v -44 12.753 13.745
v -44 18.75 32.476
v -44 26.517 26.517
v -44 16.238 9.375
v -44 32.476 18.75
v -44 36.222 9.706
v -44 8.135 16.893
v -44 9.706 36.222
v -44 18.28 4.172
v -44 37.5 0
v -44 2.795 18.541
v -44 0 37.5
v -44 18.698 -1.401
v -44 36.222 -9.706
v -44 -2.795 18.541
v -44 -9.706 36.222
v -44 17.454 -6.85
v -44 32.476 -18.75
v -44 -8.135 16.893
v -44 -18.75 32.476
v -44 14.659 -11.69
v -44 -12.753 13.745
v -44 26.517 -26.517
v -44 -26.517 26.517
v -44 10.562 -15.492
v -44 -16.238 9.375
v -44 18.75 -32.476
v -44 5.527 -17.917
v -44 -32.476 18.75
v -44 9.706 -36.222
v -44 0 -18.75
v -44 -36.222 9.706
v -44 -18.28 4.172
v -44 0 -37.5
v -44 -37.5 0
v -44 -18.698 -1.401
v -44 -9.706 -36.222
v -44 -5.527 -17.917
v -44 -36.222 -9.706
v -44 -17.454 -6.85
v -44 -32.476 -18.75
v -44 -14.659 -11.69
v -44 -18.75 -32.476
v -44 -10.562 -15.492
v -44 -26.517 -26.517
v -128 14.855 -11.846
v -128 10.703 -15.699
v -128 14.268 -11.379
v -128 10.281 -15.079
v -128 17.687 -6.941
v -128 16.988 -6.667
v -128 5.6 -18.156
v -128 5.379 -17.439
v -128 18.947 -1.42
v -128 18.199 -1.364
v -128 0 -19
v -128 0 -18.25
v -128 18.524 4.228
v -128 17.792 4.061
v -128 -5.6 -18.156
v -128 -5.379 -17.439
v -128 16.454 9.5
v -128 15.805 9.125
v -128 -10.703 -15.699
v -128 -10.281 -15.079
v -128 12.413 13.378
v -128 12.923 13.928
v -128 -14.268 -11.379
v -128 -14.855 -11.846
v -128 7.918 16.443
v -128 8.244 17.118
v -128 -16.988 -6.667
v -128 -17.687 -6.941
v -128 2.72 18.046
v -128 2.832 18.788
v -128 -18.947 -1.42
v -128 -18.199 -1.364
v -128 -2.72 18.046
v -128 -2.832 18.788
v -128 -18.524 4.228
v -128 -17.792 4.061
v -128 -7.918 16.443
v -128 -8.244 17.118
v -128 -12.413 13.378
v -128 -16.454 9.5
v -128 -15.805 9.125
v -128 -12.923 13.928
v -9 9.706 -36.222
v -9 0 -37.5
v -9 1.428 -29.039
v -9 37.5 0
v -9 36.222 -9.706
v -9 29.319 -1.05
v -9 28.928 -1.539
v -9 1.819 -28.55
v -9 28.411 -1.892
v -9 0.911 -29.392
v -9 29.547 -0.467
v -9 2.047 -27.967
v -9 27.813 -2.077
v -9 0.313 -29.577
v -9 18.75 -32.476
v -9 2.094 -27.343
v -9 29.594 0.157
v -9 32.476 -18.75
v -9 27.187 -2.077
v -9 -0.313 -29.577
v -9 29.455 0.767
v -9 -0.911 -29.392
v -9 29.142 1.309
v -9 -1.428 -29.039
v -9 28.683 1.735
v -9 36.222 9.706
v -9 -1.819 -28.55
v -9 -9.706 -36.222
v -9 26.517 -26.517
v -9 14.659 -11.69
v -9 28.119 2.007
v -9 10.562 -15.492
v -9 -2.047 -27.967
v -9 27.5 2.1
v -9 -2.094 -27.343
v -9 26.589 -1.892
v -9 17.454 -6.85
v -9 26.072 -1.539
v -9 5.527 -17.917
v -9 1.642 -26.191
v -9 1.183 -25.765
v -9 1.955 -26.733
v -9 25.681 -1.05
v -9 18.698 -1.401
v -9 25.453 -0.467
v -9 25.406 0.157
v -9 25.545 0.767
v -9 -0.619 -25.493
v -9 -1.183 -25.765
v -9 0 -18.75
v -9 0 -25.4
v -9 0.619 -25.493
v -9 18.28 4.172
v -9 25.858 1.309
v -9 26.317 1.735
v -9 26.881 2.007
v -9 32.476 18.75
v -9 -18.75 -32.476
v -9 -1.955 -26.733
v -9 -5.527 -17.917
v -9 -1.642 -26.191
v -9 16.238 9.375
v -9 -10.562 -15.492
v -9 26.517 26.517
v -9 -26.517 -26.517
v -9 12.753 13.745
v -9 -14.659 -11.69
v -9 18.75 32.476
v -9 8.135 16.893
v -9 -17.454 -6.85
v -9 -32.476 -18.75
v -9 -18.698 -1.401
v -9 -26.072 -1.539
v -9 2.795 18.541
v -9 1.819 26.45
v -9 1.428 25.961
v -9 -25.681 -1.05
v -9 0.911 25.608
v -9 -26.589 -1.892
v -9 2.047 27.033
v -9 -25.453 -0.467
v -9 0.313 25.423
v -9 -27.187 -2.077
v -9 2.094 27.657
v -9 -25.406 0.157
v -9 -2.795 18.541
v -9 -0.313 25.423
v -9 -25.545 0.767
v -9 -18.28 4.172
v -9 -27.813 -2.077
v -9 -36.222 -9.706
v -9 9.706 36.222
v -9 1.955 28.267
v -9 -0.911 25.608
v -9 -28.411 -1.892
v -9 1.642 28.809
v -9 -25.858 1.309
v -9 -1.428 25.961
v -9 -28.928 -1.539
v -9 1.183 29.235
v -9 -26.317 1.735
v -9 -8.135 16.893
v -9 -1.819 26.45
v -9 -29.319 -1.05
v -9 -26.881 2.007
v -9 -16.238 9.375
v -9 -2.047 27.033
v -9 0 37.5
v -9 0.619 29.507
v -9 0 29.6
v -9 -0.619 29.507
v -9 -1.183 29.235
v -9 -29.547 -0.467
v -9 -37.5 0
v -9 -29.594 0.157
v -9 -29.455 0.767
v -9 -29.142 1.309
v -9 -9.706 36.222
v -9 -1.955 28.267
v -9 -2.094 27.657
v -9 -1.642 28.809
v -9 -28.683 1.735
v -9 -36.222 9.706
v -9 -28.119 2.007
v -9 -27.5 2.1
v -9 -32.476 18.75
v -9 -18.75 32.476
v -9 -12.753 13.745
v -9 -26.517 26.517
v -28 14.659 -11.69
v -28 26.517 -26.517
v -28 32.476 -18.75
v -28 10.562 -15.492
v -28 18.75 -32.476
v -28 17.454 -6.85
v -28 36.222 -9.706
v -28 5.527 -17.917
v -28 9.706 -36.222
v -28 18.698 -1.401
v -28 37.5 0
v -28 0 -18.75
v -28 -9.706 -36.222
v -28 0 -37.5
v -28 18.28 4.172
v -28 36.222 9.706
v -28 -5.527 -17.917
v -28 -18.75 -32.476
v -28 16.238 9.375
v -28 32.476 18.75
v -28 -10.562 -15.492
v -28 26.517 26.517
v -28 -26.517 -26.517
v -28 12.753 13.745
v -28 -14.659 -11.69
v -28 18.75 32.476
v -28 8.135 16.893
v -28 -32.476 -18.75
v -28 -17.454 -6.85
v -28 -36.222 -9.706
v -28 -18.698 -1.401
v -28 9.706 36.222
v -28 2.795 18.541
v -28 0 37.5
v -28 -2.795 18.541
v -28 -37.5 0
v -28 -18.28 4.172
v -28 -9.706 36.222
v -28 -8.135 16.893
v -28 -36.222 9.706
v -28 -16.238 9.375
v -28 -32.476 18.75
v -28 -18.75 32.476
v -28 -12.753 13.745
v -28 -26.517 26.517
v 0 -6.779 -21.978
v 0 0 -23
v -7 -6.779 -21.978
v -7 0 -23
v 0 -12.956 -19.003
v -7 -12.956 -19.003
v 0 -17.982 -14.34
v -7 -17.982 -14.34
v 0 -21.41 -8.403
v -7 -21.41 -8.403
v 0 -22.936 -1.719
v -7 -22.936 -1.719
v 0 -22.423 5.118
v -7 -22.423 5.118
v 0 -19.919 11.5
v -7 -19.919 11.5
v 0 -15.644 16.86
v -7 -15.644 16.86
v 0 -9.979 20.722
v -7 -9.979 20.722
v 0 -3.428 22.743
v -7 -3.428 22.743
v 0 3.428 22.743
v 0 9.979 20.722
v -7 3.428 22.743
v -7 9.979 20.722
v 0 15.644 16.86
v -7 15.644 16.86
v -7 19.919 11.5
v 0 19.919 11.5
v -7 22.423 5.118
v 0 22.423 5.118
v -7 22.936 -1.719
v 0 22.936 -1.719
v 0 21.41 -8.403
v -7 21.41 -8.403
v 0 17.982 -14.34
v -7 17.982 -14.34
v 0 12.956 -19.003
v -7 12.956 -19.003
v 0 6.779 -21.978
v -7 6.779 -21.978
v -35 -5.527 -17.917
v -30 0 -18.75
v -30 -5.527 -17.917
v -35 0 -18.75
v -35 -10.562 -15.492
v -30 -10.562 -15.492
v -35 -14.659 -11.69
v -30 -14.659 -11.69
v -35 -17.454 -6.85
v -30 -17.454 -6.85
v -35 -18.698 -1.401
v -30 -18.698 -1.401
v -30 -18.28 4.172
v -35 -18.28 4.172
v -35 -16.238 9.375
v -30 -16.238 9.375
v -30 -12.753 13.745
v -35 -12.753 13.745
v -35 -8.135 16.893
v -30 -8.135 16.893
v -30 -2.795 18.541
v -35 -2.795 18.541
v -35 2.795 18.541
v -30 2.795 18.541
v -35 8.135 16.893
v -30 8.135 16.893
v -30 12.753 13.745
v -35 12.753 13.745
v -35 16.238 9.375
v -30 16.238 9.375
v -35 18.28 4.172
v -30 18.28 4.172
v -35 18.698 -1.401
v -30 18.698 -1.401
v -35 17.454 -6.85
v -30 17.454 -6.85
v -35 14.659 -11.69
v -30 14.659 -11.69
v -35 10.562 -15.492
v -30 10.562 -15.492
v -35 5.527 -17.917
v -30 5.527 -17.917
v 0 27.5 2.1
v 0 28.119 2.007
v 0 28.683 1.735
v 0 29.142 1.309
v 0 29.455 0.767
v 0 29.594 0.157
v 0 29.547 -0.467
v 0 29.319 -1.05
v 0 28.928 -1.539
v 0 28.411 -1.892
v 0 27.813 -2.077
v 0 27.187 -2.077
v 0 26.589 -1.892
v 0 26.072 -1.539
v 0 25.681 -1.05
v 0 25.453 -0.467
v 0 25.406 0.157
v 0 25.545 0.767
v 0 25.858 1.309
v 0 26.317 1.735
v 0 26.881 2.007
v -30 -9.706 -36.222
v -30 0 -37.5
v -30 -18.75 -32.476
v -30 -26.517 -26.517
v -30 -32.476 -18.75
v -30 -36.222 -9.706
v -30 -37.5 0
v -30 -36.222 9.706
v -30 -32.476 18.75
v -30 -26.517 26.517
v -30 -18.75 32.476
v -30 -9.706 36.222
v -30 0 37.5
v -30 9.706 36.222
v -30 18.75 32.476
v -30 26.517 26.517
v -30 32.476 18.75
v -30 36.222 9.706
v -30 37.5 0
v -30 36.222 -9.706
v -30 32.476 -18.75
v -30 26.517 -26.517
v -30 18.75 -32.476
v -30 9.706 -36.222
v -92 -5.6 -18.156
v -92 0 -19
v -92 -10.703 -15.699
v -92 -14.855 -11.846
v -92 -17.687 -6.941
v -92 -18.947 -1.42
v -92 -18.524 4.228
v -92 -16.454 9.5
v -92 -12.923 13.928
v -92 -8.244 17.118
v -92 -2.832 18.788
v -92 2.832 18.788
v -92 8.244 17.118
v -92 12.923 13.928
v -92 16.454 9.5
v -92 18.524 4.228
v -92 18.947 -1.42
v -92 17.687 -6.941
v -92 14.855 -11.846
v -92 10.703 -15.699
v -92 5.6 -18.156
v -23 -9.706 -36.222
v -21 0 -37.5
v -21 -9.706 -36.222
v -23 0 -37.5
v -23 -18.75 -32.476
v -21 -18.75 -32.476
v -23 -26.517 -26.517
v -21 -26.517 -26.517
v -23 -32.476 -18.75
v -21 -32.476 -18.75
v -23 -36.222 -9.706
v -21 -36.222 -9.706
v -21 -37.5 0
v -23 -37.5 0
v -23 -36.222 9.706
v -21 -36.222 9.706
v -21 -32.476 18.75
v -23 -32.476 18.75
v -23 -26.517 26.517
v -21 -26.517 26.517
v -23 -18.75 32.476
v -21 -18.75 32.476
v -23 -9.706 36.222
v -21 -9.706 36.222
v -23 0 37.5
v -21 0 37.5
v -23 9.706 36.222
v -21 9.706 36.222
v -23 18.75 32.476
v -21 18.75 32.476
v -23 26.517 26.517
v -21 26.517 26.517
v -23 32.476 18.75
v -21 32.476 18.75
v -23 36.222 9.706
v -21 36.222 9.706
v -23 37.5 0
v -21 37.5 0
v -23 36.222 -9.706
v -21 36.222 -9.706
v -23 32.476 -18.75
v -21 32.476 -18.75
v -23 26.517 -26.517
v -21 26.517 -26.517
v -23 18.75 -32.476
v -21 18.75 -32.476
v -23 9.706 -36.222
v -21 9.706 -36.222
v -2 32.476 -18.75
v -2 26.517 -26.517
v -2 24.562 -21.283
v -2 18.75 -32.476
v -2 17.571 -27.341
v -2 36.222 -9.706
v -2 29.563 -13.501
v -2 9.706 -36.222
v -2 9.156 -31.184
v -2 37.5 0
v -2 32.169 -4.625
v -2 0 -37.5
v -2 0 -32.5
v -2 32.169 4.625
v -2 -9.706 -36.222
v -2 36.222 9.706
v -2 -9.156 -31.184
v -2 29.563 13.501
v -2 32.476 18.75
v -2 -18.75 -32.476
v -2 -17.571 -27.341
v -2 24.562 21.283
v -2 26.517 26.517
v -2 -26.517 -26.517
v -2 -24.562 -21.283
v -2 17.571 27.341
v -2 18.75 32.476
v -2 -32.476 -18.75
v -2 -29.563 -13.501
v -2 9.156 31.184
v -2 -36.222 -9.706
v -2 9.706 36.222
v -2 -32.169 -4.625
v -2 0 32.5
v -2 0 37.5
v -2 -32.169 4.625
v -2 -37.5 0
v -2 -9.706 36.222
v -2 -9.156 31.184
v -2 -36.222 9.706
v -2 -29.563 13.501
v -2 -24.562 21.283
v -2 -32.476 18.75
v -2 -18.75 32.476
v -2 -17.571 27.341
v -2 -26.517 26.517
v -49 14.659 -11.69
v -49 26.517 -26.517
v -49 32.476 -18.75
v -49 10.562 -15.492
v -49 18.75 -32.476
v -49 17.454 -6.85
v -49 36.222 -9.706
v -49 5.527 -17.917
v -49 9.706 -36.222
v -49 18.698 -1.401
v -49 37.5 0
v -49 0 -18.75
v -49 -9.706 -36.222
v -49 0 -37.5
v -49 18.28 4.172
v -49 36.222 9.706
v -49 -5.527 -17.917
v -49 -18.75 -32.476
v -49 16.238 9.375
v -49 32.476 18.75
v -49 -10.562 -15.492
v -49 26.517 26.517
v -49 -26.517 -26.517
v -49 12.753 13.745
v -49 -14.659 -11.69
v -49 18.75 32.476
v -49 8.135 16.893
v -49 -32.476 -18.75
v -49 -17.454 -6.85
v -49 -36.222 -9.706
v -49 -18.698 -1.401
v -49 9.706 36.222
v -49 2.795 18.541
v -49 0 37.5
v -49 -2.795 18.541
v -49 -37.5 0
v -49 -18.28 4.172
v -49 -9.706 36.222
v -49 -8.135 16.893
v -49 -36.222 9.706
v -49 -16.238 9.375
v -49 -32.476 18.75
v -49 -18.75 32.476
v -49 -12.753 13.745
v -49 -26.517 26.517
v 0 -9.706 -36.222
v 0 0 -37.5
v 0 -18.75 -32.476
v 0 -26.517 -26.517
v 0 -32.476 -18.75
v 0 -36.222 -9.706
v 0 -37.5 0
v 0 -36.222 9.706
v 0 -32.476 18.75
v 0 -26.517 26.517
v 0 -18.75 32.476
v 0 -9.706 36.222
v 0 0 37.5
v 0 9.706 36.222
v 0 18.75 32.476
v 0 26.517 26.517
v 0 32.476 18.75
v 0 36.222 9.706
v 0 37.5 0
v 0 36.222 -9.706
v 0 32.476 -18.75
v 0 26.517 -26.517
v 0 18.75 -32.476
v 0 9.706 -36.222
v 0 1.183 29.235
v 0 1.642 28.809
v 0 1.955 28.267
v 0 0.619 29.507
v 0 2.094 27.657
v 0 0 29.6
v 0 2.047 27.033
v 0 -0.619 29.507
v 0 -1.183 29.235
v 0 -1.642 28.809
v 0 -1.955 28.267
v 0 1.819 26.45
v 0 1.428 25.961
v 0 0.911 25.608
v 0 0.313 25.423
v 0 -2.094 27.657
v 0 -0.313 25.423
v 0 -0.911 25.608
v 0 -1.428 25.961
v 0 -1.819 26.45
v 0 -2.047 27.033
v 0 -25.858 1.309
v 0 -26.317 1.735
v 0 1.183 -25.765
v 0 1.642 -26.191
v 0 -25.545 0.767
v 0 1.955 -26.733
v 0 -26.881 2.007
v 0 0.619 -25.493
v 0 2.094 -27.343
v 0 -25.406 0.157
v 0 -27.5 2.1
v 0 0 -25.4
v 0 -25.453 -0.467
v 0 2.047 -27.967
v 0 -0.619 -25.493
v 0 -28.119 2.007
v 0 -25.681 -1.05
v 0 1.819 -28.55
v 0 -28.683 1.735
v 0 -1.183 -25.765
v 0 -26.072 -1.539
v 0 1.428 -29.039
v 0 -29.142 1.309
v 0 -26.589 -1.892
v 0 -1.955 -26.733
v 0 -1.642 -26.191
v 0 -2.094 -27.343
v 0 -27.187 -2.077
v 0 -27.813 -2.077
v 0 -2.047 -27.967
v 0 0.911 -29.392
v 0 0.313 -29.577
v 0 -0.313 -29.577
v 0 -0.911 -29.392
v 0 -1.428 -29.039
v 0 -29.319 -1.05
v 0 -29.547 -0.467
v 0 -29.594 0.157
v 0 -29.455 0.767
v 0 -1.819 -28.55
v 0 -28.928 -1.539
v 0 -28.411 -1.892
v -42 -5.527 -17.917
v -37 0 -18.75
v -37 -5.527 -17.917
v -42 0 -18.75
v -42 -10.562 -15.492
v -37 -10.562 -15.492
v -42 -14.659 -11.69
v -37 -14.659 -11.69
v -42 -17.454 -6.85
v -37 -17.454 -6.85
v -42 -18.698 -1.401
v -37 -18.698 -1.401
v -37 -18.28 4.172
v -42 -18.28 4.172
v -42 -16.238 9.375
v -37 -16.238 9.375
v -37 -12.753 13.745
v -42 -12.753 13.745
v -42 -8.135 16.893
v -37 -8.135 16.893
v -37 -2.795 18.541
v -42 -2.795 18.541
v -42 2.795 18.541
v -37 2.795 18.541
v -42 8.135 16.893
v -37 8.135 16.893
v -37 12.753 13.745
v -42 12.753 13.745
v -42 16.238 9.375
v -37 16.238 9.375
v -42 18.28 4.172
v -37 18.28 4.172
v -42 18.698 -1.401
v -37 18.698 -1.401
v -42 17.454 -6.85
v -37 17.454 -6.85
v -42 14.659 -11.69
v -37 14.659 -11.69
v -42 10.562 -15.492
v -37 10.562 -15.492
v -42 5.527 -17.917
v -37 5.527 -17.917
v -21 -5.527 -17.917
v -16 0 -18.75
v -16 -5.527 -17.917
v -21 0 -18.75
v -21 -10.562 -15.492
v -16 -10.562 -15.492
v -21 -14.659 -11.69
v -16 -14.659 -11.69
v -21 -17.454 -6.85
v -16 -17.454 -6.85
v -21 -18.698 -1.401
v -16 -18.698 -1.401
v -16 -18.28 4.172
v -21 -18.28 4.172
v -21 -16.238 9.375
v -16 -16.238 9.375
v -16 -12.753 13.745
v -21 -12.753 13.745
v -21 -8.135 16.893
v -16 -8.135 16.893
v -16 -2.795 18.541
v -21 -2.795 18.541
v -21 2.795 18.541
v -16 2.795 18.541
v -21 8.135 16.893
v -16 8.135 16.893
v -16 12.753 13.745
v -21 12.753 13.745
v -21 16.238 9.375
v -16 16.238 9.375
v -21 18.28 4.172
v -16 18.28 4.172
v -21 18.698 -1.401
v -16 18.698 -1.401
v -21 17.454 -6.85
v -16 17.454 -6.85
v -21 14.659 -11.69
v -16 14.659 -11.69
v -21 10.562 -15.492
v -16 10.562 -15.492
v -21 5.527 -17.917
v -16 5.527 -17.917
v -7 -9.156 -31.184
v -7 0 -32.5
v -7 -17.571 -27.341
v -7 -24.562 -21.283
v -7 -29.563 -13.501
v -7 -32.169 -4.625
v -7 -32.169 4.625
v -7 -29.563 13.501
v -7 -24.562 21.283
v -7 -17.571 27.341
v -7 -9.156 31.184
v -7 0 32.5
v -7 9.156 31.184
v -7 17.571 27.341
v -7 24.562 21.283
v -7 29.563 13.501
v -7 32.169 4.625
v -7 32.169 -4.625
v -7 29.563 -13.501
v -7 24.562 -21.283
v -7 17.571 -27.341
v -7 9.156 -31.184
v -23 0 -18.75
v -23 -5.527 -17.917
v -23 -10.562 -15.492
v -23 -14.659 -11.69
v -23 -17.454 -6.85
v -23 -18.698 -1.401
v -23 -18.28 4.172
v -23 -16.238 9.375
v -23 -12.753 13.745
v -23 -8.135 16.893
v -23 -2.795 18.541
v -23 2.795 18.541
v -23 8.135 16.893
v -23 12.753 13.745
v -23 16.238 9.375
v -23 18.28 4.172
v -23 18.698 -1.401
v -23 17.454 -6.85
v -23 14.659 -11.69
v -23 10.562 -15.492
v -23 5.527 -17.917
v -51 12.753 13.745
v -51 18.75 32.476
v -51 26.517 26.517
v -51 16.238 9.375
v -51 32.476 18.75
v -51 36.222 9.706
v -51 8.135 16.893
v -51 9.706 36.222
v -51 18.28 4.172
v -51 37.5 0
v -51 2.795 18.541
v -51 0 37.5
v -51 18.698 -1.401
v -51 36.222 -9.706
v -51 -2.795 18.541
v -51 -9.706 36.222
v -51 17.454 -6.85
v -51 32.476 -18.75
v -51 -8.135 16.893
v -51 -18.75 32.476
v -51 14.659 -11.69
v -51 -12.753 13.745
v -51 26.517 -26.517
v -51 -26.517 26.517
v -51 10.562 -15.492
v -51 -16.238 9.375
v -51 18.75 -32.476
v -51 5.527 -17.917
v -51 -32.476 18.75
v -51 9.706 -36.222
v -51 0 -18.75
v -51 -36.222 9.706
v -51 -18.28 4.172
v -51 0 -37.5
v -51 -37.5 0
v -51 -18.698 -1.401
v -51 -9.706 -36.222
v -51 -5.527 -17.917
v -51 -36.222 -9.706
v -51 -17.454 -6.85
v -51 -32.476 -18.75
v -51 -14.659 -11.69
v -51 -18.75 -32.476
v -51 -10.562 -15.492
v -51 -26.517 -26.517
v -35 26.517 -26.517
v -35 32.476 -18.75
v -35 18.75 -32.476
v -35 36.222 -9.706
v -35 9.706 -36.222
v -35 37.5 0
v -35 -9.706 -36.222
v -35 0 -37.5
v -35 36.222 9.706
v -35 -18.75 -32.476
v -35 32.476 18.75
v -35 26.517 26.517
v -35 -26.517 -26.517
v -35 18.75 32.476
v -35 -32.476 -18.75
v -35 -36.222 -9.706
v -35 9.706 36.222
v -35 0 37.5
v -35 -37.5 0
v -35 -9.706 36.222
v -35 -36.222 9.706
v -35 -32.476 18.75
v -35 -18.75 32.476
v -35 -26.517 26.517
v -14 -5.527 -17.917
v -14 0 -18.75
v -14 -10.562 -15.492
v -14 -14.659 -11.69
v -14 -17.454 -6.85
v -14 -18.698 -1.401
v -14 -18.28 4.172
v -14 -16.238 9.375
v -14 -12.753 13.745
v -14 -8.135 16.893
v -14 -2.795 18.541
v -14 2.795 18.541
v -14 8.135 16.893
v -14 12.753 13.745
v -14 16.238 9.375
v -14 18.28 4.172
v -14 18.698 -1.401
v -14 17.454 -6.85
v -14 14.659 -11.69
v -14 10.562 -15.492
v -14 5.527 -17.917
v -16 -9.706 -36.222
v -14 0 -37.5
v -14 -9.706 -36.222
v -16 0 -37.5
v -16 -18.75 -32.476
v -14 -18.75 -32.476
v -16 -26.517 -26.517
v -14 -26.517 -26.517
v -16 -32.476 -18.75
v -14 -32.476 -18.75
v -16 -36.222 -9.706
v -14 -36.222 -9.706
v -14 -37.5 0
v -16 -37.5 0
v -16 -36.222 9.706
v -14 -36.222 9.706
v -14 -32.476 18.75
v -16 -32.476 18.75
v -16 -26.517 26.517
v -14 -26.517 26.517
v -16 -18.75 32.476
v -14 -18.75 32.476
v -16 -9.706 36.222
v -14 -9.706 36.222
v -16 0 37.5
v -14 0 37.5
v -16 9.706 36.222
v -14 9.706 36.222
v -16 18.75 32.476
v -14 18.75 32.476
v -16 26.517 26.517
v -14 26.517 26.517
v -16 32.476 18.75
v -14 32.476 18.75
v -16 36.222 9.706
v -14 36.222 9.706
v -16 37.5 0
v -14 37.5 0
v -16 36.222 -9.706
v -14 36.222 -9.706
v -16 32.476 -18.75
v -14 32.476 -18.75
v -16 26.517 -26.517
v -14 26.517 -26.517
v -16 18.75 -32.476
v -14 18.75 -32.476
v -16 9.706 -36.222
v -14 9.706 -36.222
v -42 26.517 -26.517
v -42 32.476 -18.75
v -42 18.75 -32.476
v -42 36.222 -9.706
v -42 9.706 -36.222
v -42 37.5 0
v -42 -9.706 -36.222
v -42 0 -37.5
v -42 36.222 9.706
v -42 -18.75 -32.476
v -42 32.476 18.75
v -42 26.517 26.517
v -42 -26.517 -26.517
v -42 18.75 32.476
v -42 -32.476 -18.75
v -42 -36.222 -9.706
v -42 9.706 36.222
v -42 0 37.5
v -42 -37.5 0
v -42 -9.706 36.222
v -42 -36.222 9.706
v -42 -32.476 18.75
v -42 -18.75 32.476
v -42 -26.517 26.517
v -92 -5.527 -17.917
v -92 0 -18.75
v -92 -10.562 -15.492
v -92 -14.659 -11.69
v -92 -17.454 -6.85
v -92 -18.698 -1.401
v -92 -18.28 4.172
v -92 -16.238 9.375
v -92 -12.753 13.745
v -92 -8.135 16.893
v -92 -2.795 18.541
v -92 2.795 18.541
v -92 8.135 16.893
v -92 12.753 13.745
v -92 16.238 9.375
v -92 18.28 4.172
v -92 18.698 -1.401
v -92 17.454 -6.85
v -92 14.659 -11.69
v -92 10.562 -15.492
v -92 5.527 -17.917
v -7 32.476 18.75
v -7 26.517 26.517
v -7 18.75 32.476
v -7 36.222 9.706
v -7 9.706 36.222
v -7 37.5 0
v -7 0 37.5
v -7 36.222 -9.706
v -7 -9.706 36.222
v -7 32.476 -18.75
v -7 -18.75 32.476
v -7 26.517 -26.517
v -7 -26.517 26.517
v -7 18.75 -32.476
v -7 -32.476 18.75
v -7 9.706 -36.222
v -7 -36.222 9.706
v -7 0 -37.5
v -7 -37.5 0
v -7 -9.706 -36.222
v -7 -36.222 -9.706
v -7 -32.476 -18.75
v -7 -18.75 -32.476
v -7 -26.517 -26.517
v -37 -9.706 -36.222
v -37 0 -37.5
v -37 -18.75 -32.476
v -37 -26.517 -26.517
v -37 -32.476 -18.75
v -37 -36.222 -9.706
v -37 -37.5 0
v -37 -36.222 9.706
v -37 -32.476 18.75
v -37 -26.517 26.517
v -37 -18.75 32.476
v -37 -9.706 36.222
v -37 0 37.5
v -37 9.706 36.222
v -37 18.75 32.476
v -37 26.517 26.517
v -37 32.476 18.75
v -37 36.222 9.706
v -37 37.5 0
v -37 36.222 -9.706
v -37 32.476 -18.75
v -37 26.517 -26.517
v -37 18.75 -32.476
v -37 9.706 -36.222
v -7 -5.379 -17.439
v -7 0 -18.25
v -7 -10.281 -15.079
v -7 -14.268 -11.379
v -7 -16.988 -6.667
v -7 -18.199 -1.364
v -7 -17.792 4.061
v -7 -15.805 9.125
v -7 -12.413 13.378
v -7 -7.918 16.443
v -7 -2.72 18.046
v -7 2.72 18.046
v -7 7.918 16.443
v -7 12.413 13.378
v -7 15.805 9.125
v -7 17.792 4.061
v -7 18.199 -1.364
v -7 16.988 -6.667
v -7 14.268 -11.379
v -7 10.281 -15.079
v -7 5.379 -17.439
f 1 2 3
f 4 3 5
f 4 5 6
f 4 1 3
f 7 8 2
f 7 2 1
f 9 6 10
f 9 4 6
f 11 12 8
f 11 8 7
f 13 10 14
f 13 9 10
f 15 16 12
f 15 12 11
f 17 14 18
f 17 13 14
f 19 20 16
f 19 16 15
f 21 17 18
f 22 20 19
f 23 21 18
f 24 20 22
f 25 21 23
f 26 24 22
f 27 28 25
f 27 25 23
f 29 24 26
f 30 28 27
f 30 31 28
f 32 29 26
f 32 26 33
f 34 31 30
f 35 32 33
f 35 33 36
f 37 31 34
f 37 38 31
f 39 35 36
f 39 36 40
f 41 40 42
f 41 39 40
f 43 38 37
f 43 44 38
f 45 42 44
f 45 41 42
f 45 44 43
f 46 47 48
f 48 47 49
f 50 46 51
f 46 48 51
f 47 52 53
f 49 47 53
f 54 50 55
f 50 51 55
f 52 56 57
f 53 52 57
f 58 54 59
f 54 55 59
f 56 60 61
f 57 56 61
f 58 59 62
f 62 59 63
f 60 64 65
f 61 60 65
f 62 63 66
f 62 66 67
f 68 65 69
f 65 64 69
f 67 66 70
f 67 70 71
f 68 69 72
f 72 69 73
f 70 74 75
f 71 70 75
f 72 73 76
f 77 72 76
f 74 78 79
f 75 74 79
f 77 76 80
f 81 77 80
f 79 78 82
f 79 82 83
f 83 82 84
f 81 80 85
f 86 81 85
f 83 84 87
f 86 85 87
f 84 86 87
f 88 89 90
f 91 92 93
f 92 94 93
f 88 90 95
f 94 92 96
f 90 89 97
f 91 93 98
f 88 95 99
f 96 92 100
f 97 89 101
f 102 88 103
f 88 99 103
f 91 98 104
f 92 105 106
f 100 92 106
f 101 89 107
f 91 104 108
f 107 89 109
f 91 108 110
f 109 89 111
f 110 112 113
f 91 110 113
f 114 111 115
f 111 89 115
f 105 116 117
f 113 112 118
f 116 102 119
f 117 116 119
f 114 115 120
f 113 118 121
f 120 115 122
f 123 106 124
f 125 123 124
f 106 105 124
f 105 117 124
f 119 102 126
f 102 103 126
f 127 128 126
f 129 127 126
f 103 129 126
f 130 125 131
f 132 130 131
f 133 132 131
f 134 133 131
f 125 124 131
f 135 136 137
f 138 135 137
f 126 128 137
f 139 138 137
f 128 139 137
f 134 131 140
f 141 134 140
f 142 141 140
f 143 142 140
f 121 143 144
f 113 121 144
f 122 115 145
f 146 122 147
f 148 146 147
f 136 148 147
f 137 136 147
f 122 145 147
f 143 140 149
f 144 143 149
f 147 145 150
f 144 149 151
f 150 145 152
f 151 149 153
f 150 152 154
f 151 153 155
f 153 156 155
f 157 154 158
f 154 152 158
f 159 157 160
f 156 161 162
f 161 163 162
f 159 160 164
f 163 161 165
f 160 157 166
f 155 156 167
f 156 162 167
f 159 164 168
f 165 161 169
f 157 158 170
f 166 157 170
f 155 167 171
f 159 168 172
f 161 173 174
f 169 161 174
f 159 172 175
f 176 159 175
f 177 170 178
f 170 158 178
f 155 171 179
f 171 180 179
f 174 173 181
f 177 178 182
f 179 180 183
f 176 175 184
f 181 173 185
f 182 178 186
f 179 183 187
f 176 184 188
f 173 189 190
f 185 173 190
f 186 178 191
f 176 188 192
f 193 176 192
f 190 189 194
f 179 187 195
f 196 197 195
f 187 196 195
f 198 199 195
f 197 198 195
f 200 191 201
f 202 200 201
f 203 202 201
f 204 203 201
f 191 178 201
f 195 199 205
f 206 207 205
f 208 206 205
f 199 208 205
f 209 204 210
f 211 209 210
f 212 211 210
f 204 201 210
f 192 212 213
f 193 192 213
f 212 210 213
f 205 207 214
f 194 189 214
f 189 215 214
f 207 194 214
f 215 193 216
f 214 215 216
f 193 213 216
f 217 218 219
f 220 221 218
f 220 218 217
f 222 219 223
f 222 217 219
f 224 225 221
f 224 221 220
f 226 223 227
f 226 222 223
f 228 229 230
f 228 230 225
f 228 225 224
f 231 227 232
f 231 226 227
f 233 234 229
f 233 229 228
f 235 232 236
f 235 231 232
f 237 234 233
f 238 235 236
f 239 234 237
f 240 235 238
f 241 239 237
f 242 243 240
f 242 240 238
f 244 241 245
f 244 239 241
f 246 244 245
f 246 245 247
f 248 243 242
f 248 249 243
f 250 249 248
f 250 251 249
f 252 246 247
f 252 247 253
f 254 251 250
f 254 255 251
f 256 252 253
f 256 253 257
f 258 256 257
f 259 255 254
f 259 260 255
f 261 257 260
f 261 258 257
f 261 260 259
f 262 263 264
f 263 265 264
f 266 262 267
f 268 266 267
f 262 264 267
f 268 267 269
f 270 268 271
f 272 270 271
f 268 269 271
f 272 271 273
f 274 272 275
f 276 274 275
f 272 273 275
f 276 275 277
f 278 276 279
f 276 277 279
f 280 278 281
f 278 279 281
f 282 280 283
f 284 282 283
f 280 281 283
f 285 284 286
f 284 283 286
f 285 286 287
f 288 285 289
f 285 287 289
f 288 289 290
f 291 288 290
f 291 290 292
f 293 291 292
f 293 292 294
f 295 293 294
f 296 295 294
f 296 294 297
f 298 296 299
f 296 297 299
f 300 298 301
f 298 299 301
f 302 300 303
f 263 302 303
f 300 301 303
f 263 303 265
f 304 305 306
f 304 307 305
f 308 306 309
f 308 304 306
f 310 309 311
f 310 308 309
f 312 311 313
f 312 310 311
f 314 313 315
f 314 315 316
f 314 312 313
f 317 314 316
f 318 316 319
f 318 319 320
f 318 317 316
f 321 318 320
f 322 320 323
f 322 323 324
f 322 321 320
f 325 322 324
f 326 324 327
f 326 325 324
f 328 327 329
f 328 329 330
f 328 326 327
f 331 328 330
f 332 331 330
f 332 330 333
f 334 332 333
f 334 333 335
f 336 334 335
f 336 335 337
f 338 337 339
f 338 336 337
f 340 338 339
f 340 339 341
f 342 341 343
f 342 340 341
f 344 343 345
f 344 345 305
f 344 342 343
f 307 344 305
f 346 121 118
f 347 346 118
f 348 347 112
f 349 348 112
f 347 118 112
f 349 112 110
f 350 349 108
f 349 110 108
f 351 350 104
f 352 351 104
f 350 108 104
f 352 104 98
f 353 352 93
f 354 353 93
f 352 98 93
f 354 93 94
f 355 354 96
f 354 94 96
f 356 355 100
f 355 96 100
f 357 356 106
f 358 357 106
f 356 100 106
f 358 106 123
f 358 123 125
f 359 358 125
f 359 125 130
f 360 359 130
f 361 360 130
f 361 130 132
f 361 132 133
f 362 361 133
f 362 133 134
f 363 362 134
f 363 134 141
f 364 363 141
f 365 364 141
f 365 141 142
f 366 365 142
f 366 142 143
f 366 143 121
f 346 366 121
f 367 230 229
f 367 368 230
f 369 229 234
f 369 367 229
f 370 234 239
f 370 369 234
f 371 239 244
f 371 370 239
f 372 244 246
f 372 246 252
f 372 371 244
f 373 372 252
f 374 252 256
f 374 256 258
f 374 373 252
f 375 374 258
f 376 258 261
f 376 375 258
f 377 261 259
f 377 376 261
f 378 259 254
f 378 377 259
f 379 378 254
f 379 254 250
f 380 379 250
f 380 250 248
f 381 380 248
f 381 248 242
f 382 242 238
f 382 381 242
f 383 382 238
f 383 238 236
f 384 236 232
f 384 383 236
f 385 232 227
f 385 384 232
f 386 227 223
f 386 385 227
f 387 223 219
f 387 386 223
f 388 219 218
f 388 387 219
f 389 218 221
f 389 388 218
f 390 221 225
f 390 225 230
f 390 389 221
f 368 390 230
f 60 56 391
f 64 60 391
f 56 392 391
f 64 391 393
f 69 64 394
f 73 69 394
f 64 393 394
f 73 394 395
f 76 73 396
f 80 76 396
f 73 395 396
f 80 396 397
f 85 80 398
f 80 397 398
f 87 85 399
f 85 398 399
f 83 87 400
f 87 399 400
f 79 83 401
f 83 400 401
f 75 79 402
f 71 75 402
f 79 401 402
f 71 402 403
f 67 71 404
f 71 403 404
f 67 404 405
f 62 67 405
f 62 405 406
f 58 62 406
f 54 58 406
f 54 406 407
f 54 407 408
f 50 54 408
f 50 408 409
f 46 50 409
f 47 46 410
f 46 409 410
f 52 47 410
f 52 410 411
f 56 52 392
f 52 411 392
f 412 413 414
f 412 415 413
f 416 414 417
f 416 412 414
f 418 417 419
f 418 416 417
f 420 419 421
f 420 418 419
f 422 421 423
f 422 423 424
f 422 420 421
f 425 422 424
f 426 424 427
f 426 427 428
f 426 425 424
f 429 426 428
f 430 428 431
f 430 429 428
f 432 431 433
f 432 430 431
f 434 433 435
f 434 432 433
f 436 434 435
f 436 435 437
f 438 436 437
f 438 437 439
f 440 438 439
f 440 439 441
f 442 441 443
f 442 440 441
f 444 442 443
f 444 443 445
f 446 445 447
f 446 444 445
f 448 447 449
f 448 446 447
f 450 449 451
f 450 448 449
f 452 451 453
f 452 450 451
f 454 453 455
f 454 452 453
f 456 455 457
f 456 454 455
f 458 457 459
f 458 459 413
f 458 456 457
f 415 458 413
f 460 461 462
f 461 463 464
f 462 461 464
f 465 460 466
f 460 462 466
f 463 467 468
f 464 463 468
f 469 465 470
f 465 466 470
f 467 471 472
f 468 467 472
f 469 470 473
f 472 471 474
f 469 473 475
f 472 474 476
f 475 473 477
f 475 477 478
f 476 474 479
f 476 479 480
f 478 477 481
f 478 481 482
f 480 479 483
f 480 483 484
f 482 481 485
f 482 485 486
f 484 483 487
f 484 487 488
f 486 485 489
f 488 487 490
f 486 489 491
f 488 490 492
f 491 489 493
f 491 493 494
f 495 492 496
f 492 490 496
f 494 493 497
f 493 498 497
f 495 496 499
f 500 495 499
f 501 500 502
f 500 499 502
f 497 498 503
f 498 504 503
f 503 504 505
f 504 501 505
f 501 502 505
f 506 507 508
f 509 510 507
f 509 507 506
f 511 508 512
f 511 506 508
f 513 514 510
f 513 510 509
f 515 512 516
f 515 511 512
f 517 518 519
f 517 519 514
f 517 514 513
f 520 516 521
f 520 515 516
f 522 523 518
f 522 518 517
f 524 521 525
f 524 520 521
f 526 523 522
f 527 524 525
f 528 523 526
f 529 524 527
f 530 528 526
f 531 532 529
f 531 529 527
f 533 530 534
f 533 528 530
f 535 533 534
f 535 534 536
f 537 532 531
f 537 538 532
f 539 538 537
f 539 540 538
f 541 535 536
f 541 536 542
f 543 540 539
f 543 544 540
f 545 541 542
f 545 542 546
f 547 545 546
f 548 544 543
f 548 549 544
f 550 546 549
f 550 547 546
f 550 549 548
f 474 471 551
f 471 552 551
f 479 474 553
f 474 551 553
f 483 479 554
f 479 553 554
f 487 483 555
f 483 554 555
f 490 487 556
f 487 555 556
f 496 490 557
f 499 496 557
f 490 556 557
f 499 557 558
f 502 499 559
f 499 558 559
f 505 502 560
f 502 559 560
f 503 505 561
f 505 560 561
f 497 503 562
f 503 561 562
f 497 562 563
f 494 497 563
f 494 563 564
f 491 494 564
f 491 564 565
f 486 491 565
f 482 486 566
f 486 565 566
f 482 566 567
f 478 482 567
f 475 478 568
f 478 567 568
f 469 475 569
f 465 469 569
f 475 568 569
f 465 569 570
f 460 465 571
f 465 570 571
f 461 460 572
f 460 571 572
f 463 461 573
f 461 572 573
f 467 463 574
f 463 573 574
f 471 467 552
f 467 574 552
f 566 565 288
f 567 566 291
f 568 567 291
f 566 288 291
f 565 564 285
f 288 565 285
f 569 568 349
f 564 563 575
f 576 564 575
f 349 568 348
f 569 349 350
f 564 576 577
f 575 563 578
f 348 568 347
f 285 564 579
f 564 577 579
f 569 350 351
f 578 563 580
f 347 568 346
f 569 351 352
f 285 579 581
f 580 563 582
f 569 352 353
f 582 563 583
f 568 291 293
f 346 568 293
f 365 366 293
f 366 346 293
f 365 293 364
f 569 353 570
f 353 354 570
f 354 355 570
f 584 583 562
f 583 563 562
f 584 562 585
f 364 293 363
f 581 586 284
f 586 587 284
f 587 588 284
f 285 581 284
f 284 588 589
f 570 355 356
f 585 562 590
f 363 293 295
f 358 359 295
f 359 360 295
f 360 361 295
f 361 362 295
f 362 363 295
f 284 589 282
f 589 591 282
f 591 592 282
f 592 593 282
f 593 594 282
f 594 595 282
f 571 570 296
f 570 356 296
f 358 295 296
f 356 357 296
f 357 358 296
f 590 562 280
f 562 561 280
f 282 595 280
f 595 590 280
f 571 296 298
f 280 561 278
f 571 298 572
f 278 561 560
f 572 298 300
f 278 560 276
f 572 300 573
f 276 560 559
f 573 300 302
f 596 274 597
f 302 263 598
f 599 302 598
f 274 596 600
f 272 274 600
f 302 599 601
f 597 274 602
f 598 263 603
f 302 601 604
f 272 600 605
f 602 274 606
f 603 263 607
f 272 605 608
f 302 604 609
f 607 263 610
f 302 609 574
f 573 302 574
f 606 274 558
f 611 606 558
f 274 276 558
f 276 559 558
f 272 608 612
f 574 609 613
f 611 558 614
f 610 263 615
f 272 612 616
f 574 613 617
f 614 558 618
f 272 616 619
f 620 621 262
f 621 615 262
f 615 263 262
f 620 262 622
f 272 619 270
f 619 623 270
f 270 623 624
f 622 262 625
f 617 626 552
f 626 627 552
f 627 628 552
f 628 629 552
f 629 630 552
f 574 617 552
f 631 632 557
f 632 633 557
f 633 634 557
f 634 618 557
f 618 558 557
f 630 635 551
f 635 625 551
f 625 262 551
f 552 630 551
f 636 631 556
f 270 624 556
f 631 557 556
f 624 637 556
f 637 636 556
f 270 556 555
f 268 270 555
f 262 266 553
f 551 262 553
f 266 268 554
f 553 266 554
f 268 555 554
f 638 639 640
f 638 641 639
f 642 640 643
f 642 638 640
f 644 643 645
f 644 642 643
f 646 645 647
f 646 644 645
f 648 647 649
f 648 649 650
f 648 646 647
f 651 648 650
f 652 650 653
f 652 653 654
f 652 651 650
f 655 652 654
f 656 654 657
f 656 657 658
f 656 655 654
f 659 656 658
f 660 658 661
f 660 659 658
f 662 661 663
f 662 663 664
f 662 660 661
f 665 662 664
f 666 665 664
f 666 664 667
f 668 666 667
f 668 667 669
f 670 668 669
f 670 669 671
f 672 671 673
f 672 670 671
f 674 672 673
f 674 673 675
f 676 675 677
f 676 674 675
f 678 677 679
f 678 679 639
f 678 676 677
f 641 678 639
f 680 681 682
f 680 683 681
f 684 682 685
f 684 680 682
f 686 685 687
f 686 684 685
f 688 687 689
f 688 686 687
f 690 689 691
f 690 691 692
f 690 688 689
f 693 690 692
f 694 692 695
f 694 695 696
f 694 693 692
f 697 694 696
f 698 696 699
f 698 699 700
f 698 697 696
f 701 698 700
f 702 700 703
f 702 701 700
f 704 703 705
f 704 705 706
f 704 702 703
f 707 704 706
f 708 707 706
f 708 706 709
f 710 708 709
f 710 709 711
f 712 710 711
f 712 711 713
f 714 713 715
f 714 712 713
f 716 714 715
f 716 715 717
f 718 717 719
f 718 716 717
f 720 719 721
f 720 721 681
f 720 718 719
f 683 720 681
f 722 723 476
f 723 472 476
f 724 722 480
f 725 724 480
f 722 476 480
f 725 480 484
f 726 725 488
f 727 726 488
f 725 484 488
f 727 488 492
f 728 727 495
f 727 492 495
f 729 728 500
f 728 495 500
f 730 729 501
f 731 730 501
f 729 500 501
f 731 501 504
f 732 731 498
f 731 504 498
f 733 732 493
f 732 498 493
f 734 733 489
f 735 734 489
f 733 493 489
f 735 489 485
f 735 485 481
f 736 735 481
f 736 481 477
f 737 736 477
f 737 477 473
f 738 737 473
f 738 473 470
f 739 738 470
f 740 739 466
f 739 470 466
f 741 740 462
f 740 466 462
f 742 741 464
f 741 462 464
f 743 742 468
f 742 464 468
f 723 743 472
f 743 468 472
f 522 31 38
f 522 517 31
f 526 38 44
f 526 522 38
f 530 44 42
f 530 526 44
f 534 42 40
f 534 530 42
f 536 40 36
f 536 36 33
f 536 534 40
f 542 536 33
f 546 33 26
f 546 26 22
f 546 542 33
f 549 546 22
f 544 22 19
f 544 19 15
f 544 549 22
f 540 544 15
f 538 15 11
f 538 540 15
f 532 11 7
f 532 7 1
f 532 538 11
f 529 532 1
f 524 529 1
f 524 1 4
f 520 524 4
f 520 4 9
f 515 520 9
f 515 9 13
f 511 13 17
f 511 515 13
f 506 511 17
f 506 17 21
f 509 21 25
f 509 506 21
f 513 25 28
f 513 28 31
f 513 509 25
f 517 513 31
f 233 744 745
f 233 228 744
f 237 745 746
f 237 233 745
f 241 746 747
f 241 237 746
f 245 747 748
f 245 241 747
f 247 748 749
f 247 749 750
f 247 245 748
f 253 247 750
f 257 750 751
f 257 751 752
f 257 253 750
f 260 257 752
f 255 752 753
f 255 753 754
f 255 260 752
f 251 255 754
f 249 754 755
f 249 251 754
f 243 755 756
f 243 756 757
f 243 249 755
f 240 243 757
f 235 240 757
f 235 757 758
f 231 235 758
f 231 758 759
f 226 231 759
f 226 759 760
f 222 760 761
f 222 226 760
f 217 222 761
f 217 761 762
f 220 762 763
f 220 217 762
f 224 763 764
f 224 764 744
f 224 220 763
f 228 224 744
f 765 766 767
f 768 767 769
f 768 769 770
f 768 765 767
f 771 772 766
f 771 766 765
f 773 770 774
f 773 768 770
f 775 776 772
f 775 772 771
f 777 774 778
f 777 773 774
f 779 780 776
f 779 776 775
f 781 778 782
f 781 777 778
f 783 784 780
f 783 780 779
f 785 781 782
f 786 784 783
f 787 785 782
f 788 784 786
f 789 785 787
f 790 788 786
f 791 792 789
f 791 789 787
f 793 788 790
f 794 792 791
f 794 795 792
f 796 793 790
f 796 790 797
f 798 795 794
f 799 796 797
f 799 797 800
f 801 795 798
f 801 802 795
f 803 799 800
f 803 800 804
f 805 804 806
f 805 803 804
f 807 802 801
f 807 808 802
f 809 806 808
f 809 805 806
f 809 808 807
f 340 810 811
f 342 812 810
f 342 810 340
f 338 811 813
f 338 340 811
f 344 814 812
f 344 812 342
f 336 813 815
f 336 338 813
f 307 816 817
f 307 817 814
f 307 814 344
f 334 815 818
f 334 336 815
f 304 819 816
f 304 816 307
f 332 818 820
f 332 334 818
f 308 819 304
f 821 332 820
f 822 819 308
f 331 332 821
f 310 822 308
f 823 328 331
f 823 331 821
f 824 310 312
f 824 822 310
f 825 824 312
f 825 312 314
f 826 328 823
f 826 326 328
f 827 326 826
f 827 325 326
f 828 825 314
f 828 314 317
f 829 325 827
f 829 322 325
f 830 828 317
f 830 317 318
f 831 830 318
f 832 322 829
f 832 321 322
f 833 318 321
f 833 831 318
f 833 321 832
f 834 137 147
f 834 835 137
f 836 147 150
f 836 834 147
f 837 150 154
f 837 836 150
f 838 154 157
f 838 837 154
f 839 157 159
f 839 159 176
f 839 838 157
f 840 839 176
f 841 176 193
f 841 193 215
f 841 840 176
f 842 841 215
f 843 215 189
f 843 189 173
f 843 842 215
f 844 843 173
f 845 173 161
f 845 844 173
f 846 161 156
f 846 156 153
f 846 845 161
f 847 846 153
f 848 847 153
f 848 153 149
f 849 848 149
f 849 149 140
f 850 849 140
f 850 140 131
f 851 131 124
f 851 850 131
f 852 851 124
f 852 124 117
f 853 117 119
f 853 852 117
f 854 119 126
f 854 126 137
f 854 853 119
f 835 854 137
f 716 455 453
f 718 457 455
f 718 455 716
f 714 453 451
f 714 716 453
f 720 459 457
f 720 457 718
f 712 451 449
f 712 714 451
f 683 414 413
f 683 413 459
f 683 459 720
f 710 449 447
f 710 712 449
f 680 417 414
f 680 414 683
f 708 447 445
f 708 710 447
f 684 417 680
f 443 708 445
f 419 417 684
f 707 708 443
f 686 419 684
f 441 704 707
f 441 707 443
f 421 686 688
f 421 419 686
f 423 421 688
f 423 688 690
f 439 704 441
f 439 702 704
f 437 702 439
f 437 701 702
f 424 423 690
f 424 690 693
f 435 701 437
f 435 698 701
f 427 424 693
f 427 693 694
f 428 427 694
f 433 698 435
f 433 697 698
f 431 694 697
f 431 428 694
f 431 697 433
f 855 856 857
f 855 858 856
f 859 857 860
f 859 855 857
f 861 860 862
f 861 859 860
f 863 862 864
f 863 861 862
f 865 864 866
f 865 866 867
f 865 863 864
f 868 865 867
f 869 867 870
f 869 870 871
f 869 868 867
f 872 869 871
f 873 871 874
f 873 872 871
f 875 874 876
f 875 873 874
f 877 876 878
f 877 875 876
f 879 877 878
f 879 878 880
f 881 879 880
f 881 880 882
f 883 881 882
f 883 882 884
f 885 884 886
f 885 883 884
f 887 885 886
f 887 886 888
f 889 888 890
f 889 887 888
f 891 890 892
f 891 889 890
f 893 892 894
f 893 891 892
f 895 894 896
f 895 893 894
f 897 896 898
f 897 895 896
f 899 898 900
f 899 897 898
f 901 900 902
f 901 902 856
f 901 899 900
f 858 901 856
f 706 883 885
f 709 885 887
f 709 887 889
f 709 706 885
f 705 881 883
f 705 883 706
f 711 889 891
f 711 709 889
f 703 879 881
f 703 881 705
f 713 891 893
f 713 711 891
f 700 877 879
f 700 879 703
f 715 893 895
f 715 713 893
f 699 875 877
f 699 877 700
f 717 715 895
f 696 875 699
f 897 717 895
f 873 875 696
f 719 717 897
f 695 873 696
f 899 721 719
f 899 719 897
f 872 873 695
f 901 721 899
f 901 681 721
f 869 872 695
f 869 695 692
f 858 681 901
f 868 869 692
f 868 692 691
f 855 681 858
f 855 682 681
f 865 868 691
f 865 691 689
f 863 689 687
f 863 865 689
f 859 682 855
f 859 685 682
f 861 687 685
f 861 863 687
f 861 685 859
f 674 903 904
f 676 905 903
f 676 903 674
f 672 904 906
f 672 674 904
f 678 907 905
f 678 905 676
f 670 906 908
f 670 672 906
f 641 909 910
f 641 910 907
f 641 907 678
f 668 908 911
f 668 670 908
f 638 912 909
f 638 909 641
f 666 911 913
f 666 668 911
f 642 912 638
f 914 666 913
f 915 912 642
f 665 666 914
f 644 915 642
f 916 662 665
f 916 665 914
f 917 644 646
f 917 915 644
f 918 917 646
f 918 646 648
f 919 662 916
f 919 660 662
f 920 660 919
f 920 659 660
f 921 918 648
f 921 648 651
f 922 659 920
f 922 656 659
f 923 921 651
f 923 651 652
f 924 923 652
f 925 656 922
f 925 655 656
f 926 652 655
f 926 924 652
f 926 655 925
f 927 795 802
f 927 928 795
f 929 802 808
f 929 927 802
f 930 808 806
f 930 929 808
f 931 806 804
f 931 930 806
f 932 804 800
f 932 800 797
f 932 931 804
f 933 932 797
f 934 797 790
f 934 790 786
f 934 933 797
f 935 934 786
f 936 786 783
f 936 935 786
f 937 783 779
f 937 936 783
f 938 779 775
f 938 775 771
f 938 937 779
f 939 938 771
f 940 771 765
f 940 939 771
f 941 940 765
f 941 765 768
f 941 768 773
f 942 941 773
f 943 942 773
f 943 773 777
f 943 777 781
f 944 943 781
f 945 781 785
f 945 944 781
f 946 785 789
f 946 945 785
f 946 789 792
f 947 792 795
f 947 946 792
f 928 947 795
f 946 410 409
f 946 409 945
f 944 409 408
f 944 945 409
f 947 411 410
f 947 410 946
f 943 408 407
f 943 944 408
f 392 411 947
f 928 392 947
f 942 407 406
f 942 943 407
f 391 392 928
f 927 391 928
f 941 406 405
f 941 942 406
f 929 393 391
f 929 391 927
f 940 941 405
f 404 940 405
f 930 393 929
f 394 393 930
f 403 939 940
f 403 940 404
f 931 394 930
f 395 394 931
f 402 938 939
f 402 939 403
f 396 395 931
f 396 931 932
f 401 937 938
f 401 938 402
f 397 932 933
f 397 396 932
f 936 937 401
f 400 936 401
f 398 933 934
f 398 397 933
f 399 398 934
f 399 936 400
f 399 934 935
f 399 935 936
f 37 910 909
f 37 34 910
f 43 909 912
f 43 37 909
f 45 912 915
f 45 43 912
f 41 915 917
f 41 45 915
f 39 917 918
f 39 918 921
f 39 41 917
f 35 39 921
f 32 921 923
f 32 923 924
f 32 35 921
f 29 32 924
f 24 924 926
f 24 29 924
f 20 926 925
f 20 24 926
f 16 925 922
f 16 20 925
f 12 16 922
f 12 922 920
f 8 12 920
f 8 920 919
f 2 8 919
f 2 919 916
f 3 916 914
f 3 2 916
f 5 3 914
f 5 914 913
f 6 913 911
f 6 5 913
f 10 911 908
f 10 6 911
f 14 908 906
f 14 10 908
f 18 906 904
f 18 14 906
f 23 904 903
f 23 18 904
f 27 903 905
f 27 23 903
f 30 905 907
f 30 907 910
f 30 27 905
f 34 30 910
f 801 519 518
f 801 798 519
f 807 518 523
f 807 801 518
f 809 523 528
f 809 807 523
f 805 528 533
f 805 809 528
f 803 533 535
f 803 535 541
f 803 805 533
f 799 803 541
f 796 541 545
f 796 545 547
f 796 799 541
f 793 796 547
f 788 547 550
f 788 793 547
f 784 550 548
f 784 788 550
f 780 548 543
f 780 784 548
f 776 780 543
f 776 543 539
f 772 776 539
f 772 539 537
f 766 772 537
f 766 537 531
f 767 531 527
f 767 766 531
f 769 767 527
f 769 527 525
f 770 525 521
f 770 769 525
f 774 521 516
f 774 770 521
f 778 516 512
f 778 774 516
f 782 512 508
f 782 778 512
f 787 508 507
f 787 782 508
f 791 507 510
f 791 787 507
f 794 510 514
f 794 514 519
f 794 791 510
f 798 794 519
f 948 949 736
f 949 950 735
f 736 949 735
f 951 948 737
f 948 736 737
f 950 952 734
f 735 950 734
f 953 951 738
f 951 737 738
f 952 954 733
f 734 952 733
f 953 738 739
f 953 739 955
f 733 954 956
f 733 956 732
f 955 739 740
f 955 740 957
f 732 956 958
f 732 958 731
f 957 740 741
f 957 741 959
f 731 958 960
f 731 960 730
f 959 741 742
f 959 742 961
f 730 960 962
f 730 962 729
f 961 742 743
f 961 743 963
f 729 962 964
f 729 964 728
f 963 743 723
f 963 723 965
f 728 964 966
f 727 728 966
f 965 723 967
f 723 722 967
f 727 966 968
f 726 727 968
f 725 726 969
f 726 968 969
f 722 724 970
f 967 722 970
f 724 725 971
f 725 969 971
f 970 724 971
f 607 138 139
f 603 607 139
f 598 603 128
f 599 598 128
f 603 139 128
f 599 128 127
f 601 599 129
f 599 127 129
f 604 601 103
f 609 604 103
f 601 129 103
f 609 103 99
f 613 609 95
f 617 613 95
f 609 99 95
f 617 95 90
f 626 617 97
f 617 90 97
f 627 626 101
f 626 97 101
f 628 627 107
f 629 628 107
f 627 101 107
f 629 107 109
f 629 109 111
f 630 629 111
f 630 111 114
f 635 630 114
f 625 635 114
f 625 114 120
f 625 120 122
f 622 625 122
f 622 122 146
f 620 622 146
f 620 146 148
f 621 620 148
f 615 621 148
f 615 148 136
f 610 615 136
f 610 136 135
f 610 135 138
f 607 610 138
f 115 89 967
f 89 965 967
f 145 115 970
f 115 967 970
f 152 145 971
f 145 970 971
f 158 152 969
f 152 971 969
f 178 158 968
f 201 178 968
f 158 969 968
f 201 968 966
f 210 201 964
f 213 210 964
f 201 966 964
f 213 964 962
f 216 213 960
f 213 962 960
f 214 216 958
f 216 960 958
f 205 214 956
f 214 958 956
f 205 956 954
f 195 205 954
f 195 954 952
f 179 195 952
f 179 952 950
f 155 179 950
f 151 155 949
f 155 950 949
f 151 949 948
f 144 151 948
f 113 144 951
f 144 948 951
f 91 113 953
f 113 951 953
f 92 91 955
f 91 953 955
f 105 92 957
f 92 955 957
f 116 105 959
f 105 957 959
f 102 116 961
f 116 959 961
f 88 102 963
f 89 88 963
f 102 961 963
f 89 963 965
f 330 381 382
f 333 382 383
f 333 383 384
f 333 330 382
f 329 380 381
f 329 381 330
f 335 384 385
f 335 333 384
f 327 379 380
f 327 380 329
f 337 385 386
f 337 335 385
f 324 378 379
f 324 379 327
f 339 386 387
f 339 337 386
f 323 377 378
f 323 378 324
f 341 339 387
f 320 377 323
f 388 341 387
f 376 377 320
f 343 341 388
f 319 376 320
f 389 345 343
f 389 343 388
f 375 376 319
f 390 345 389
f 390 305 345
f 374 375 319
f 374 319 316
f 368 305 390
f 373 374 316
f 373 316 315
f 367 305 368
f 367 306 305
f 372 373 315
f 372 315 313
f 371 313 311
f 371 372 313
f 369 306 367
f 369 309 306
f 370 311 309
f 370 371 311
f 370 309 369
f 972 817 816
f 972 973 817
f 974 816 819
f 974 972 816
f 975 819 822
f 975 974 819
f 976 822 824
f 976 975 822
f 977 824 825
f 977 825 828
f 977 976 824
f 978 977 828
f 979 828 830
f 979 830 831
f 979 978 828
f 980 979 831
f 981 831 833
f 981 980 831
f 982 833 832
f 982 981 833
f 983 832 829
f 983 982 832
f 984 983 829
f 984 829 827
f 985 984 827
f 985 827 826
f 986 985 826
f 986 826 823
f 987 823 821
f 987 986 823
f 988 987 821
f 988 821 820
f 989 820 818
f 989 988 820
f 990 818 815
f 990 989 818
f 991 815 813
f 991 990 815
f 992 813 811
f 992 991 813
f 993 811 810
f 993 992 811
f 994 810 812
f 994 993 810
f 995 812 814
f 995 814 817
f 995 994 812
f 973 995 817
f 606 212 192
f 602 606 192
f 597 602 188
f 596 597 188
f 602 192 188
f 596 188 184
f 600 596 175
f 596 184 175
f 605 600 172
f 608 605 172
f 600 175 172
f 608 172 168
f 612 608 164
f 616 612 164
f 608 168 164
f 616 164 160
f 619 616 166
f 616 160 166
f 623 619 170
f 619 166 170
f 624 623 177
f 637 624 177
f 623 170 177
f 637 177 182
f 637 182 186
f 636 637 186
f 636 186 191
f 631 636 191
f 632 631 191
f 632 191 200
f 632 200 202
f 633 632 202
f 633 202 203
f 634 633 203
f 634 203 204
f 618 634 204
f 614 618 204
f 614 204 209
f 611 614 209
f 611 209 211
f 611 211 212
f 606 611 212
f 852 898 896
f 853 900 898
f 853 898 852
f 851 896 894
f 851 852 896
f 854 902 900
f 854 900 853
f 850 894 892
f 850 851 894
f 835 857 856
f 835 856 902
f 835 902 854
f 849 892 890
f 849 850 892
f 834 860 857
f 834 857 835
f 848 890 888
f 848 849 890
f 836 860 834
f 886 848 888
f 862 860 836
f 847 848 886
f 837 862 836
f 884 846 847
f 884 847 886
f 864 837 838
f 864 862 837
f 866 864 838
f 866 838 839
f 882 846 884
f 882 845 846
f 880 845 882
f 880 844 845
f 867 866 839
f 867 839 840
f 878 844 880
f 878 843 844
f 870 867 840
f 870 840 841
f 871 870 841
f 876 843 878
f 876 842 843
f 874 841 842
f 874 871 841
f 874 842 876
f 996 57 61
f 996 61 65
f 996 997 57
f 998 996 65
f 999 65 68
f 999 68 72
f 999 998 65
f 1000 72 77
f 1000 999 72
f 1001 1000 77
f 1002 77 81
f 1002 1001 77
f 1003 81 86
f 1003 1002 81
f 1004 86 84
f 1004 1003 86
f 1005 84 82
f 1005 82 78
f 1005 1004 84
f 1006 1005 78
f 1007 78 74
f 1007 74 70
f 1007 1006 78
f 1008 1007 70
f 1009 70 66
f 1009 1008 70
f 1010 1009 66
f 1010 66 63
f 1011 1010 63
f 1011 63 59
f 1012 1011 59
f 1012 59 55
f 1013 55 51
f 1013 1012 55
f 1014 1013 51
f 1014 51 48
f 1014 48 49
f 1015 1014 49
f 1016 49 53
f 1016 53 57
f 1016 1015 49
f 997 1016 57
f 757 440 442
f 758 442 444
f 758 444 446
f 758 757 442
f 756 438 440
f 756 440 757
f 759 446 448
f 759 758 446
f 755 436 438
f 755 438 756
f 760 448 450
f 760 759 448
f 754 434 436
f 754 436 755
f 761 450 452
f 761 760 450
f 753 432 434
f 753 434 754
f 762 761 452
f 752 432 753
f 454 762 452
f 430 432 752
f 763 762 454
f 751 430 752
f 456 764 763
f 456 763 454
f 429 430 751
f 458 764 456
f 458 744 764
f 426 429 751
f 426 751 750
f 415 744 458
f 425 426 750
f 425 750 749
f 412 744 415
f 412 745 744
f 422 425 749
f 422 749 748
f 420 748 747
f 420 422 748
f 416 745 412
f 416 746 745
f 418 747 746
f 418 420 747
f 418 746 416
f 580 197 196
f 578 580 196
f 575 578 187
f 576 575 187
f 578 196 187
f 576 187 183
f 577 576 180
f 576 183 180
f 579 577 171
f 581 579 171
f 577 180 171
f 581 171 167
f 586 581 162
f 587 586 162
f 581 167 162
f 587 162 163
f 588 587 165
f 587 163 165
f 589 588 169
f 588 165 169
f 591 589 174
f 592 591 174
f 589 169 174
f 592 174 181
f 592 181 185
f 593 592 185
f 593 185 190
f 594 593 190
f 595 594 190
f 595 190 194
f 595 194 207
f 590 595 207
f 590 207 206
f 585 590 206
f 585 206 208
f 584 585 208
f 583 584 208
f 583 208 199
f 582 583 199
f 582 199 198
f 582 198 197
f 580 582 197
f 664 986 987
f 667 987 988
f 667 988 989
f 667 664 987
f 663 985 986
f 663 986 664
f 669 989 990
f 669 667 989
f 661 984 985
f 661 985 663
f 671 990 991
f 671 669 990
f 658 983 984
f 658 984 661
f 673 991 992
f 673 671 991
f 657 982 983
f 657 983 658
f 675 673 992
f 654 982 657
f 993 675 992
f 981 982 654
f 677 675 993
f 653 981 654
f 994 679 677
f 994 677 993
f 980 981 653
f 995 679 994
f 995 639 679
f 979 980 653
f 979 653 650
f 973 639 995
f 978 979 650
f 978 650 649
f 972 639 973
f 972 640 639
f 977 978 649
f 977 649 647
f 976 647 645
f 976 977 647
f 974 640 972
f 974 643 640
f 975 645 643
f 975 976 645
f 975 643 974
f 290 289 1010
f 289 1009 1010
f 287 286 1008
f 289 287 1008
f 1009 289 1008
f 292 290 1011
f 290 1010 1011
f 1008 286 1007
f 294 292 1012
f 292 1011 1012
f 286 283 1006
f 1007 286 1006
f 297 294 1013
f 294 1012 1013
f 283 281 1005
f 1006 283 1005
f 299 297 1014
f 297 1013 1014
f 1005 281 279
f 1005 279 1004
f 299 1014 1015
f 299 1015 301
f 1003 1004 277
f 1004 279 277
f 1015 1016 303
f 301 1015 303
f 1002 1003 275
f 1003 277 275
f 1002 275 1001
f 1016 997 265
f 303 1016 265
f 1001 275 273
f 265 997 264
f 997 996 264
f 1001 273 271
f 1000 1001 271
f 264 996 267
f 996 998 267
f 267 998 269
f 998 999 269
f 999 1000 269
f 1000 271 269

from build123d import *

# Parameters (mm, degrees)
SKETCH1_W                 = 36
SKETCH1_H                 = 0.75
M5X0_8_TAPPED_HOLE3_D     = 4.2
M5X0_8_TAPPED_HOLE3_DEPTH = 9


with BuildPart() as part:
    # Sketch1 → Revolve1 (revolve)
    with BuildSketch(Plane.XY, mode=Mode.PRIVATE) as revolve1_sk:
        with Locations((-110, 18.625)):
            Rectangle(SKETCH1_W, SKETCH1_H)
        Polygon((-92, 18.75), (-92, 18.25), (-9, 18.25), (-9, 18.75), (-14, 18.75), (-14, 37.5), (-16, 37.5), (-16, 18.75), (-21, 18.75), (-21, 37.5), (-23, 37.5), (-23, 18.75), (-28, 18.75), (-28, 37.5), (-30, 37.5), (-30, 18.75), (-35, 18.75), (-35, 37.5), (-37, 37.5), (-37, 18.75), (-42, 18.75), (-42, 37.5), (-44, 37.5), (-44, 18.75), (-49, 18.75), (-49, 37.5), (-51, 37.5), (-51, 18.75), (-56, 18.75), align=None)
        Polygon((-7, 18.25), (-9, 18.25), (-9, 37.5), (-7, 37.5), (-7, 32.5), (-2, 32.5), (-2, 37.5), (0, 37.5), (0, 23), (-7, 23), align=None)
    revolve(revolve1_sk.sketch.rotate(Axis((0, 0, 0), (-1, 0, 0)), 90), axis=Axis((0, 0, 0), (-1, 0, 0)))

    # M5x0.8 Tapped Hole3
    with Locations(Plane(origin=(0, 0, 0), x_dir=(0, 0, -1), z_dir=(1, 0, 0))):
        with Locations((0, 27.5), (-27.5, 0), (0, -27.5), (27.5, 0)):
            Hole(M5X0_8_TAPPED_HOLE3_D / 2, depth=M5X0_8_TAPPED_HOLE3_DEPTH)


solid = part.part
